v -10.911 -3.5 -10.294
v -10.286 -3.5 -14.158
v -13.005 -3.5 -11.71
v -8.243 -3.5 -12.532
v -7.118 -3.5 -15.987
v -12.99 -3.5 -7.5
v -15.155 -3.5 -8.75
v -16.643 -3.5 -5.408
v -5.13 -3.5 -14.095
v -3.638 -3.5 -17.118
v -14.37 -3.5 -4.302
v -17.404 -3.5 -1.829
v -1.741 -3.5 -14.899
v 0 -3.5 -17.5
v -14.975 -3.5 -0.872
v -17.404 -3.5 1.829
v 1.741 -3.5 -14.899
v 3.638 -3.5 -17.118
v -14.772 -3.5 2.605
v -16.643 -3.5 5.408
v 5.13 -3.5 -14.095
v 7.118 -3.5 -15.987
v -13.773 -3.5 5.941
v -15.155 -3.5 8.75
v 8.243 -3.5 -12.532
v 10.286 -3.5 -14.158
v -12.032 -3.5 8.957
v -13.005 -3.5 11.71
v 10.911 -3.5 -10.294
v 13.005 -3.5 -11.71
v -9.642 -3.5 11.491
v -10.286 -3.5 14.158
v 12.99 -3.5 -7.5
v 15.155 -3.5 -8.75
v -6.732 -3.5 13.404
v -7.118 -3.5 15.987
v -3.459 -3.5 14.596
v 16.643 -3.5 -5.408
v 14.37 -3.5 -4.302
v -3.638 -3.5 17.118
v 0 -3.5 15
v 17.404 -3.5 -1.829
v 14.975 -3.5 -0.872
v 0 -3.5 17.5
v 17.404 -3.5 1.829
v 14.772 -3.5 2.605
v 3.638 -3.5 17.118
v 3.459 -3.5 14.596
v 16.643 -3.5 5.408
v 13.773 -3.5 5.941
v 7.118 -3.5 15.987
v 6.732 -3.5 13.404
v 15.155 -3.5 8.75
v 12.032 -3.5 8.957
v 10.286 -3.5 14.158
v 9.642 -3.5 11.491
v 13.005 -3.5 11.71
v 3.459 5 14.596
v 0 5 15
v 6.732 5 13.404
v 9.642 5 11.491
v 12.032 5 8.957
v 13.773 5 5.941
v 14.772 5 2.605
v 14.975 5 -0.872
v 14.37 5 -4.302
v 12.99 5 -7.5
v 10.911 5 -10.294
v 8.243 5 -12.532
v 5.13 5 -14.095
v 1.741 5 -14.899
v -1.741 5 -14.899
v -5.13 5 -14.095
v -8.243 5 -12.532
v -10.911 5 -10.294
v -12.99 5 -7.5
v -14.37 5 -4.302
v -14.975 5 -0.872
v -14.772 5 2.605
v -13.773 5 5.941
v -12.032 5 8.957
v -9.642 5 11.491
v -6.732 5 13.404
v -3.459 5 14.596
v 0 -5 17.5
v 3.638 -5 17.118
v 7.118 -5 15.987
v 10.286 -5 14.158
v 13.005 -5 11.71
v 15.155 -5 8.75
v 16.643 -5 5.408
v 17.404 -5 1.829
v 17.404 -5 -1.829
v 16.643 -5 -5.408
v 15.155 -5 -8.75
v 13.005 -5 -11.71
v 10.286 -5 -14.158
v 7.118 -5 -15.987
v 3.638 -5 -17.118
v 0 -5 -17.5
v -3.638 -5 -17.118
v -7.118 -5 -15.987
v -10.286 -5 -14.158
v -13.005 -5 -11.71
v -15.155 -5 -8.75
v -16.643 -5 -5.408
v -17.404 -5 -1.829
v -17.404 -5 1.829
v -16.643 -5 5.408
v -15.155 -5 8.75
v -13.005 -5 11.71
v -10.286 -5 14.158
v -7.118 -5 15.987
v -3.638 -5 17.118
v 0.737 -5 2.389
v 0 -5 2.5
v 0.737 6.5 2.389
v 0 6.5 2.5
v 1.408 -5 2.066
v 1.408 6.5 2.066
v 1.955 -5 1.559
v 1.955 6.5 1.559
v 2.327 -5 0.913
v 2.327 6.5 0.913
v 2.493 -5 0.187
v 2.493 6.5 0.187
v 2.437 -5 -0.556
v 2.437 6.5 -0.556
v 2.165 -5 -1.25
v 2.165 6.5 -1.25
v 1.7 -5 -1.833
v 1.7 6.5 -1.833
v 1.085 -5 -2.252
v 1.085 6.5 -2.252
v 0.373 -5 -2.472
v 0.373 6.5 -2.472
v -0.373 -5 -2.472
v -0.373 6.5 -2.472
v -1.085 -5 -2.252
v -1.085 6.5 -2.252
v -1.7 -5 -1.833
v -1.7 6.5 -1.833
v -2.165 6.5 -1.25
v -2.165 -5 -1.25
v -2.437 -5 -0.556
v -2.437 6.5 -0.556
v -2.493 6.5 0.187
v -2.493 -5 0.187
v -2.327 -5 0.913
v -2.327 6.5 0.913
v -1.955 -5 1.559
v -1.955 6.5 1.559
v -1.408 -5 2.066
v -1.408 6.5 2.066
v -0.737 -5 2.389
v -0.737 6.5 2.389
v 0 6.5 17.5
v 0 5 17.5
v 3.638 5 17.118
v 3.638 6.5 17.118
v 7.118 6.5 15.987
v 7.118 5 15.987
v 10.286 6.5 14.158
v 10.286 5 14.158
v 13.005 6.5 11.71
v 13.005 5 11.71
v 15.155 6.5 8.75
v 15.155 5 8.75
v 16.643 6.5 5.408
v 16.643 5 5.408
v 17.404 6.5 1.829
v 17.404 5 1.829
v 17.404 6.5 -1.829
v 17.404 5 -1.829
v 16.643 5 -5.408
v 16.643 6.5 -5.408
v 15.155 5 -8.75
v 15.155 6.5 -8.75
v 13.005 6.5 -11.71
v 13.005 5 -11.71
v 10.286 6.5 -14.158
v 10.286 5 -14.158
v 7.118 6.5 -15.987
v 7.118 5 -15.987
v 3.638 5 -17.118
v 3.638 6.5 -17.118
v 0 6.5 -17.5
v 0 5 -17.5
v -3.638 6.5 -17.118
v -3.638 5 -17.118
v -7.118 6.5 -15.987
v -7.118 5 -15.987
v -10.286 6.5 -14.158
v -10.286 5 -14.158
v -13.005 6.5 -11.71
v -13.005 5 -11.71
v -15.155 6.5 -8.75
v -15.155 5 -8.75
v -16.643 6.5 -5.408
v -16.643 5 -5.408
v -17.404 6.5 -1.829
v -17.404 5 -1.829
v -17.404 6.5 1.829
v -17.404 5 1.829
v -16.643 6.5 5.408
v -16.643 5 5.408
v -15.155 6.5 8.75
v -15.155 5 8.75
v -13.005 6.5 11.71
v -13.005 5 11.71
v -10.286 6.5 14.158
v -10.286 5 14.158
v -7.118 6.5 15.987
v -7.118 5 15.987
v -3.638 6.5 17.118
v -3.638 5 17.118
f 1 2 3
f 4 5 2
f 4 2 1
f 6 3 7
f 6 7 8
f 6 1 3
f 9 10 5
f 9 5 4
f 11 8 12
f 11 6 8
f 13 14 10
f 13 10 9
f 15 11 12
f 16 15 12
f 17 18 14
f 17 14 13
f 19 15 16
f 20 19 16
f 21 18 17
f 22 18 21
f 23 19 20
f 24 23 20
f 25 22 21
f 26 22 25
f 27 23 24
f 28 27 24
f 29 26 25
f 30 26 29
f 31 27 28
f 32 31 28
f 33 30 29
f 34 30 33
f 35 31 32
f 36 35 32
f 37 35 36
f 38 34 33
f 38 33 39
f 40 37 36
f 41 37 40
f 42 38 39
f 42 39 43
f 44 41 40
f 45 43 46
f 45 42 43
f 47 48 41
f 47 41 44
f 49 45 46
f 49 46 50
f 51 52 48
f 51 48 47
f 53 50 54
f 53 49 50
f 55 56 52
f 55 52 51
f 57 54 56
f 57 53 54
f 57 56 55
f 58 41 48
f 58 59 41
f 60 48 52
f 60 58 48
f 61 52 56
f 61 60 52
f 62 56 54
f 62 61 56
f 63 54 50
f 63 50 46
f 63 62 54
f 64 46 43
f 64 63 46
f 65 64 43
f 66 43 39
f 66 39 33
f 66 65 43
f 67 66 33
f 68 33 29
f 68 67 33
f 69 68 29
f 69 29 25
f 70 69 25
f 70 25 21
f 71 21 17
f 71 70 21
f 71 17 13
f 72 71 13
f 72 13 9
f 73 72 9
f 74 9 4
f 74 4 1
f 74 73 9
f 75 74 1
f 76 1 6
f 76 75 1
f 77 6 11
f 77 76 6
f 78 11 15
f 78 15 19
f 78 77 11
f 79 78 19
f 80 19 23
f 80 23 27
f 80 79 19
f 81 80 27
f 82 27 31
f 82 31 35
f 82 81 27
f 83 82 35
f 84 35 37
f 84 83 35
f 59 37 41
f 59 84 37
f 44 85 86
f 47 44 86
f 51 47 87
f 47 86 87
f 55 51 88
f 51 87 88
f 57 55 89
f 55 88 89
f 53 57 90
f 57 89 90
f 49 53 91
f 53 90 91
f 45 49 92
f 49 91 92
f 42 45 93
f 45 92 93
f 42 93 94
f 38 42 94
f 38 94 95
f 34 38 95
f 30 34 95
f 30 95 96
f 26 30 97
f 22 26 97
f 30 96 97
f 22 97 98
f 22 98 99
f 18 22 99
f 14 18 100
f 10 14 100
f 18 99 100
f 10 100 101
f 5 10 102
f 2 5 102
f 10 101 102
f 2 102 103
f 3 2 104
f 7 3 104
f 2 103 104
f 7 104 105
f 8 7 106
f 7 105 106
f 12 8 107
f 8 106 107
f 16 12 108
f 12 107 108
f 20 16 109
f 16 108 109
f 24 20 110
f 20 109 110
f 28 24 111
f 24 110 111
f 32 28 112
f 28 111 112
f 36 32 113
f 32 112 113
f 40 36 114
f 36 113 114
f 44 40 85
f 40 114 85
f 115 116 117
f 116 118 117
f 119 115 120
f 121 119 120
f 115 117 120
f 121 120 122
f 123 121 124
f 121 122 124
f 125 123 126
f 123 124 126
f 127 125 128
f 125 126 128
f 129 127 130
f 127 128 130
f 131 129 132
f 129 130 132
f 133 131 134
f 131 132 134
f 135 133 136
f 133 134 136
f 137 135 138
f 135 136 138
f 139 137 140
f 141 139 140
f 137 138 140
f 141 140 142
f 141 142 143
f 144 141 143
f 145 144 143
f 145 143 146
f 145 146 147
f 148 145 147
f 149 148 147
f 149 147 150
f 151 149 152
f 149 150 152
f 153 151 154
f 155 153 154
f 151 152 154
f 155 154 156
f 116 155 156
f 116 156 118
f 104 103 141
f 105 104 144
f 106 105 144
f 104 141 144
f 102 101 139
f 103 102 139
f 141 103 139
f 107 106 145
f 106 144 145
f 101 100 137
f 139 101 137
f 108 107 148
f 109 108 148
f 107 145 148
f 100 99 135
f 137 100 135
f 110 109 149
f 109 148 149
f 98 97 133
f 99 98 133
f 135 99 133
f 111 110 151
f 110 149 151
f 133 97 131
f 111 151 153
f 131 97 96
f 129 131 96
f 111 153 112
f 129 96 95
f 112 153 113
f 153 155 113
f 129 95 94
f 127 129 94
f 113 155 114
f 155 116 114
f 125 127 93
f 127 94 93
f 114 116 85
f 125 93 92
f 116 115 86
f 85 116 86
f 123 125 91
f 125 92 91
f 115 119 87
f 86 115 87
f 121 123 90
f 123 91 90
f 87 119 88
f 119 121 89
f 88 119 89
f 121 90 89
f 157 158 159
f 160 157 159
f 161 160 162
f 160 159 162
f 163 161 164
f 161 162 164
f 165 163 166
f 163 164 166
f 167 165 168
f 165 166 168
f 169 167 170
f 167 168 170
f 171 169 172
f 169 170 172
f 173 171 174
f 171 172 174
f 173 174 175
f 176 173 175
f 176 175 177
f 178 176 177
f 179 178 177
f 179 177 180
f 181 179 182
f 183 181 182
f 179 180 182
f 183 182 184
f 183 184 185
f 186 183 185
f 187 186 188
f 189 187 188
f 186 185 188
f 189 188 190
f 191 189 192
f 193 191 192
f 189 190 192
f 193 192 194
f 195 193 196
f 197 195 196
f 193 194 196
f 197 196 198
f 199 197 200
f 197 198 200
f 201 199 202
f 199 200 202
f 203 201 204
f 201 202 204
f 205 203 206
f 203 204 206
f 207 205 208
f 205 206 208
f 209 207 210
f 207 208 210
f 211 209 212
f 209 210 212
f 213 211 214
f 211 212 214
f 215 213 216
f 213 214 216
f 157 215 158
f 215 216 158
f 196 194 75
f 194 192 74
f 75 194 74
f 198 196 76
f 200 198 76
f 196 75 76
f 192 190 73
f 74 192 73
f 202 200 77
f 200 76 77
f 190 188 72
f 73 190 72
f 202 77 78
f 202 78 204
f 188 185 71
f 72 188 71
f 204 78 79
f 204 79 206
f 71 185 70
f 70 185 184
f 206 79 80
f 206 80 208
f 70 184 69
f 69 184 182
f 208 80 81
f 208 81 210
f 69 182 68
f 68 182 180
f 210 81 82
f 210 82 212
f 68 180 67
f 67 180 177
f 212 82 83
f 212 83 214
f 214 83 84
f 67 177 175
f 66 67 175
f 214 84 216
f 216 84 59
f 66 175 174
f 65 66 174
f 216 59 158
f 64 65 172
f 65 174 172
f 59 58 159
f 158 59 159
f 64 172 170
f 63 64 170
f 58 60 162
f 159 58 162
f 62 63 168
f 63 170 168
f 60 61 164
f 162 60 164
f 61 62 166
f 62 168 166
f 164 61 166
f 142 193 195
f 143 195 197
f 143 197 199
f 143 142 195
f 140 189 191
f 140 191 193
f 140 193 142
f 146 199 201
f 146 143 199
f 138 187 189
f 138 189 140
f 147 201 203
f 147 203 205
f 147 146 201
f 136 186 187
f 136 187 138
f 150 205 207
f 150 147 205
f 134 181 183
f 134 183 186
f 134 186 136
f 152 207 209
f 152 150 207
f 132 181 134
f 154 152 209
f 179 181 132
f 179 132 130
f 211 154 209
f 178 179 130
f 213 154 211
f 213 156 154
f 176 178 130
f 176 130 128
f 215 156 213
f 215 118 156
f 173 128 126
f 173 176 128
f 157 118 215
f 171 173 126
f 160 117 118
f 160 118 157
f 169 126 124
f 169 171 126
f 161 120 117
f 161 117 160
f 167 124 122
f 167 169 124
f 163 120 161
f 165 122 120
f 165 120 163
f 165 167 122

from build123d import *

# Parameters (mm, degrees)
SKETCH_205_R        = 15
EXTRUDE_1_DEPTH     = 5
EXTRUDE_START       = 5
SKETCH_286_R        = 17.5
EXTRUDE_1_2_DEPTH   = 1.5
EXTRUDE_START_2     = -5
SKETCH_2_2_R        = 17.5
EXTRUDE_2_DEPTH     = 1.5
SKETCH_407_R        = 2.5
CUT_EXTRUDE_1_DEPTH = 6.5


with BuildPart() as part:
    # Sketch 205 → Extrude 1 (new, symmetric)
    with BuildSketch(Plane(origin=(0, 0, 0), x_dir=(1, 0, 0), z_dir=(0, 1, 0))):
        with Locations(Location((0, 0, 0), (0, 0, 270))):
            Circle(SKETCH_205_R)
    extrude(amount=EXTRUDE_1_DEPTH, both=True)

    # Sketch 286 → Extrude 1 2 (add)
    with BuildSketch(Plane(origin=(0, 0, 0), x_dir=(1, 0, 0), z_dir=(0, 1, 0)).offset(EXTRUDE_START)):
        with Locations(Location((0, 0, 0), (0, 0, 270))):
            Circle(SKETCH_286_R)
    extrude(amount=EXTRUDE_1_2_DEPTH)

    # 草图2<2> → 边缘2 (add)
    with BuildSketch(Plane(origin=(0, 0, 0), x_dir=(1, 0, 0), z_dir=(0, 1, 0)).offset(EXTRUDE_START_2)):
        with Locations(Location((0, 0, 0), (0, 0, 270))):
            Circle(SKETCH_2_2_R)
    extrude(amount=EXTRUDE_2_DEPTH)

    # Sketch 407 → 切除-拉伸1 (cut, symmetric)
    with BuildSketch(Plane(origin=(0, 0, 0), x_dir=(1, 0, 0), z_dir=(0, 1, 0))):
        with Locations(Location((0, 0, 0), (0, 0, 270))):
            Circle(SKETCH_407_R)
    extrude(amount=CUT_EXTRUDE_1_DEPTH, both=True, mode=Mode.SUBTRACT)


solid = part.part
